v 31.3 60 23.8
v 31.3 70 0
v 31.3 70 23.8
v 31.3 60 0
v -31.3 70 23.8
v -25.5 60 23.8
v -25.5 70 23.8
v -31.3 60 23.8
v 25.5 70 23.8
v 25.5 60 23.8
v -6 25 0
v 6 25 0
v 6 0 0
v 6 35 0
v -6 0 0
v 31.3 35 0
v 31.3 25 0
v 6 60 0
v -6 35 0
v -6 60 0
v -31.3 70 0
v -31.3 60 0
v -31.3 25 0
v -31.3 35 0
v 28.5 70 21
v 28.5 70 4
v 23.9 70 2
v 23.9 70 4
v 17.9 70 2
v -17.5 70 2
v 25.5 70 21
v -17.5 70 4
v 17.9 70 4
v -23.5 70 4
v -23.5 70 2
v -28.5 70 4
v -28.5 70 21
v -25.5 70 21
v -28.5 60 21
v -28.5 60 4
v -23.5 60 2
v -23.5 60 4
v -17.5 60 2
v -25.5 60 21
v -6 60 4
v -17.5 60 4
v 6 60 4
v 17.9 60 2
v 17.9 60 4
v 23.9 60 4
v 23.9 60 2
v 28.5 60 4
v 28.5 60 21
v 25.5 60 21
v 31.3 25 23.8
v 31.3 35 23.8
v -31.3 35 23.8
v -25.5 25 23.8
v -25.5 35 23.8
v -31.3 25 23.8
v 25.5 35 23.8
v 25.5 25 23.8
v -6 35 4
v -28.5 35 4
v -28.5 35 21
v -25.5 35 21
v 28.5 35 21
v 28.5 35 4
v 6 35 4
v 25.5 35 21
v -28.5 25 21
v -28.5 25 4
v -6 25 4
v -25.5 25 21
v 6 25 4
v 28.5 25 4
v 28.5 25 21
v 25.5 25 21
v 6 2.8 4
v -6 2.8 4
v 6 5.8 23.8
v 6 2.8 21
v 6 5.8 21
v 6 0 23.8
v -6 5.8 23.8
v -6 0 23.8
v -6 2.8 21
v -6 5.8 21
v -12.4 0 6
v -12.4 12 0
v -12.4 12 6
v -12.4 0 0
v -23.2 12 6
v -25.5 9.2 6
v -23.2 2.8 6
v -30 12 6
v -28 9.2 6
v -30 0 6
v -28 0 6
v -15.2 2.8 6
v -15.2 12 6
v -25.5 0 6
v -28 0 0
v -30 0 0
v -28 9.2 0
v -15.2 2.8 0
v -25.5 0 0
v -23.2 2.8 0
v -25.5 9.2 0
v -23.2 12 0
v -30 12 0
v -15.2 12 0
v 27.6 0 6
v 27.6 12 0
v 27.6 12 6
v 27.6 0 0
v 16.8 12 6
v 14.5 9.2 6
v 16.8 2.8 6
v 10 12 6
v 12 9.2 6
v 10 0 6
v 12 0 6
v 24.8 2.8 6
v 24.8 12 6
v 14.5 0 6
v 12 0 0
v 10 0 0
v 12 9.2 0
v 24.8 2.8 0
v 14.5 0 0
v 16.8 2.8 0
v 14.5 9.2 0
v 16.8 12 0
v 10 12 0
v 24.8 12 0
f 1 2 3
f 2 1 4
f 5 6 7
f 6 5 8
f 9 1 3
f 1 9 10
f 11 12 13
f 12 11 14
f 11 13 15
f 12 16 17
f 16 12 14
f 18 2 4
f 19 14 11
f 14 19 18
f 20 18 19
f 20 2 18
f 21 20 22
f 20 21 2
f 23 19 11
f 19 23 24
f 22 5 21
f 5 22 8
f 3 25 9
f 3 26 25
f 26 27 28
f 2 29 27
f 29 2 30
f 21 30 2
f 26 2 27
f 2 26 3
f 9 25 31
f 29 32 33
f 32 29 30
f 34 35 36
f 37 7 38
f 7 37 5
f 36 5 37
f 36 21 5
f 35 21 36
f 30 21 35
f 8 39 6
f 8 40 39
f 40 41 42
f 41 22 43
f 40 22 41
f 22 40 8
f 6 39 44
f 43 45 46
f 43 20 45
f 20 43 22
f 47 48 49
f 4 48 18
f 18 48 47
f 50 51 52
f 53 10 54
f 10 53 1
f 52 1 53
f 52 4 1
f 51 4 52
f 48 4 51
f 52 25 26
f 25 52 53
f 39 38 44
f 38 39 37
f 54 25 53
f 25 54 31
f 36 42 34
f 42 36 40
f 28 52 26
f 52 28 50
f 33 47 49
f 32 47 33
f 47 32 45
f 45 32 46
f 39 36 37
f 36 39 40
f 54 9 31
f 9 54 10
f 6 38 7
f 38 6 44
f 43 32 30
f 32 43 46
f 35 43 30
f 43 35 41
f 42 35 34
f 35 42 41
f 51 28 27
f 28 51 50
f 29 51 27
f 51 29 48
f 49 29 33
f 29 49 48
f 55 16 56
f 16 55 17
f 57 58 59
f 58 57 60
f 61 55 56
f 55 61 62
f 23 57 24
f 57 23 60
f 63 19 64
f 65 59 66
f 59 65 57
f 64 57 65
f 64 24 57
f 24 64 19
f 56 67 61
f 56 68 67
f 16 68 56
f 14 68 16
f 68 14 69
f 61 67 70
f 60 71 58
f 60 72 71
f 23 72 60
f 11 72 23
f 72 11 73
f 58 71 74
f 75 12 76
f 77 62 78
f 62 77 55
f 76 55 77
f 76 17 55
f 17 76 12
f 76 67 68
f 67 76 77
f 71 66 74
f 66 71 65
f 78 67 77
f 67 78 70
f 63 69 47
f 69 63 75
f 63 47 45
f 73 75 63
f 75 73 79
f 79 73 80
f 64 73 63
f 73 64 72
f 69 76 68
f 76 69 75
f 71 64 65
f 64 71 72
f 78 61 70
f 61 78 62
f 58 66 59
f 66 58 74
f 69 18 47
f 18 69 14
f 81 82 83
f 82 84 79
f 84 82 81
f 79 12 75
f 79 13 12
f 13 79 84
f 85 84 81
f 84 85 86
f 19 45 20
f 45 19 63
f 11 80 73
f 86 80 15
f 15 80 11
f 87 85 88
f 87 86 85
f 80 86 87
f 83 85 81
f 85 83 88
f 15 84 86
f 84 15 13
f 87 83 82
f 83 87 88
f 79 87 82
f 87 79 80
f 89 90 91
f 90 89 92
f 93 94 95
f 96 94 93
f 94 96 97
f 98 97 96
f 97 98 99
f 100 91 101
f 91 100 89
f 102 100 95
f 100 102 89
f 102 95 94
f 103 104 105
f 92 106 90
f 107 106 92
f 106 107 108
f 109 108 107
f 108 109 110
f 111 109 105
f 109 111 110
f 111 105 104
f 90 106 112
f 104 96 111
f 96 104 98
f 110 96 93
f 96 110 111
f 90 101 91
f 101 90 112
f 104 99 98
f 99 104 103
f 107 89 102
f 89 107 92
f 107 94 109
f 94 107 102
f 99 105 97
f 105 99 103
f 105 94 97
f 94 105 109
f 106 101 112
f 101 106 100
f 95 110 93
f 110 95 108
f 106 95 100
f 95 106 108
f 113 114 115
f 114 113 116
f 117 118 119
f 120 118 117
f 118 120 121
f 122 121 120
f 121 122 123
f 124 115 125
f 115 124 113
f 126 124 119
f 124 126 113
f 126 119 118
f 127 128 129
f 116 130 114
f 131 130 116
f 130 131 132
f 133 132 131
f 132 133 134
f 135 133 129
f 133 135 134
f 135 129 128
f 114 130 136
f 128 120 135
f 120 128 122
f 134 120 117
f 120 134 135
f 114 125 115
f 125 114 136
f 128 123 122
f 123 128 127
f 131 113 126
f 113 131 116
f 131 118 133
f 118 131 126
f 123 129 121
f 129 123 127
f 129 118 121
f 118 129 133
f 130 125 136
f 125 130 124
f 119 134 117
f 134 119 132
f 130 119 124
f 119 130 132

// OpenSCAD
wall=2.8;
$fn=100;

difference() {
	union() {
		// base
		translate([-6,0,0]) cube([12,60,4]);

		// back
		translate([-57/2-wall,60,0]) difference() {
			cube([2*wall+57,10,17+4+wall]);
			translate([wall,-1,4])cube([57,12,17]);
			translate([wall+3,-wall,4+2*wall])cube([57-6,10+2*wall,17]);
			// cuts for holder
			#translate([5+wall,0,2]) cube([6,12,2]);
			#translate([57-5-wall,0,2]) cube([6,12,2]);
		}

		// middle
		translate([-57/2-wall,25,0]) difference() {
			cube([2*wall+57,10,17+4+wall]);
			translate([wall,-1,4])cube([57,12,17]);
			translate([wall+3,-wall,4+2*wall])cube([57-6,10+2*wall,17]);
		}
		
		// front
		translate([-6,0,0]) difference() {
			cube([12,3+wall,17+4+wall]);
			#translate([-1,wall,4]) cube([14,3,17]);
		}	
	}
}


// holder
module holder() {
	difference() {
		cube([4+2*wall+8,12,6]);
		translate([2,-wall,0]) cube([2.5,12,6]);
		translate([wall+4,wall,0]) cube([8,12,6]);
	}
}

translate([-30,0,0]) holder();
translate([10,0,0]) holder();
